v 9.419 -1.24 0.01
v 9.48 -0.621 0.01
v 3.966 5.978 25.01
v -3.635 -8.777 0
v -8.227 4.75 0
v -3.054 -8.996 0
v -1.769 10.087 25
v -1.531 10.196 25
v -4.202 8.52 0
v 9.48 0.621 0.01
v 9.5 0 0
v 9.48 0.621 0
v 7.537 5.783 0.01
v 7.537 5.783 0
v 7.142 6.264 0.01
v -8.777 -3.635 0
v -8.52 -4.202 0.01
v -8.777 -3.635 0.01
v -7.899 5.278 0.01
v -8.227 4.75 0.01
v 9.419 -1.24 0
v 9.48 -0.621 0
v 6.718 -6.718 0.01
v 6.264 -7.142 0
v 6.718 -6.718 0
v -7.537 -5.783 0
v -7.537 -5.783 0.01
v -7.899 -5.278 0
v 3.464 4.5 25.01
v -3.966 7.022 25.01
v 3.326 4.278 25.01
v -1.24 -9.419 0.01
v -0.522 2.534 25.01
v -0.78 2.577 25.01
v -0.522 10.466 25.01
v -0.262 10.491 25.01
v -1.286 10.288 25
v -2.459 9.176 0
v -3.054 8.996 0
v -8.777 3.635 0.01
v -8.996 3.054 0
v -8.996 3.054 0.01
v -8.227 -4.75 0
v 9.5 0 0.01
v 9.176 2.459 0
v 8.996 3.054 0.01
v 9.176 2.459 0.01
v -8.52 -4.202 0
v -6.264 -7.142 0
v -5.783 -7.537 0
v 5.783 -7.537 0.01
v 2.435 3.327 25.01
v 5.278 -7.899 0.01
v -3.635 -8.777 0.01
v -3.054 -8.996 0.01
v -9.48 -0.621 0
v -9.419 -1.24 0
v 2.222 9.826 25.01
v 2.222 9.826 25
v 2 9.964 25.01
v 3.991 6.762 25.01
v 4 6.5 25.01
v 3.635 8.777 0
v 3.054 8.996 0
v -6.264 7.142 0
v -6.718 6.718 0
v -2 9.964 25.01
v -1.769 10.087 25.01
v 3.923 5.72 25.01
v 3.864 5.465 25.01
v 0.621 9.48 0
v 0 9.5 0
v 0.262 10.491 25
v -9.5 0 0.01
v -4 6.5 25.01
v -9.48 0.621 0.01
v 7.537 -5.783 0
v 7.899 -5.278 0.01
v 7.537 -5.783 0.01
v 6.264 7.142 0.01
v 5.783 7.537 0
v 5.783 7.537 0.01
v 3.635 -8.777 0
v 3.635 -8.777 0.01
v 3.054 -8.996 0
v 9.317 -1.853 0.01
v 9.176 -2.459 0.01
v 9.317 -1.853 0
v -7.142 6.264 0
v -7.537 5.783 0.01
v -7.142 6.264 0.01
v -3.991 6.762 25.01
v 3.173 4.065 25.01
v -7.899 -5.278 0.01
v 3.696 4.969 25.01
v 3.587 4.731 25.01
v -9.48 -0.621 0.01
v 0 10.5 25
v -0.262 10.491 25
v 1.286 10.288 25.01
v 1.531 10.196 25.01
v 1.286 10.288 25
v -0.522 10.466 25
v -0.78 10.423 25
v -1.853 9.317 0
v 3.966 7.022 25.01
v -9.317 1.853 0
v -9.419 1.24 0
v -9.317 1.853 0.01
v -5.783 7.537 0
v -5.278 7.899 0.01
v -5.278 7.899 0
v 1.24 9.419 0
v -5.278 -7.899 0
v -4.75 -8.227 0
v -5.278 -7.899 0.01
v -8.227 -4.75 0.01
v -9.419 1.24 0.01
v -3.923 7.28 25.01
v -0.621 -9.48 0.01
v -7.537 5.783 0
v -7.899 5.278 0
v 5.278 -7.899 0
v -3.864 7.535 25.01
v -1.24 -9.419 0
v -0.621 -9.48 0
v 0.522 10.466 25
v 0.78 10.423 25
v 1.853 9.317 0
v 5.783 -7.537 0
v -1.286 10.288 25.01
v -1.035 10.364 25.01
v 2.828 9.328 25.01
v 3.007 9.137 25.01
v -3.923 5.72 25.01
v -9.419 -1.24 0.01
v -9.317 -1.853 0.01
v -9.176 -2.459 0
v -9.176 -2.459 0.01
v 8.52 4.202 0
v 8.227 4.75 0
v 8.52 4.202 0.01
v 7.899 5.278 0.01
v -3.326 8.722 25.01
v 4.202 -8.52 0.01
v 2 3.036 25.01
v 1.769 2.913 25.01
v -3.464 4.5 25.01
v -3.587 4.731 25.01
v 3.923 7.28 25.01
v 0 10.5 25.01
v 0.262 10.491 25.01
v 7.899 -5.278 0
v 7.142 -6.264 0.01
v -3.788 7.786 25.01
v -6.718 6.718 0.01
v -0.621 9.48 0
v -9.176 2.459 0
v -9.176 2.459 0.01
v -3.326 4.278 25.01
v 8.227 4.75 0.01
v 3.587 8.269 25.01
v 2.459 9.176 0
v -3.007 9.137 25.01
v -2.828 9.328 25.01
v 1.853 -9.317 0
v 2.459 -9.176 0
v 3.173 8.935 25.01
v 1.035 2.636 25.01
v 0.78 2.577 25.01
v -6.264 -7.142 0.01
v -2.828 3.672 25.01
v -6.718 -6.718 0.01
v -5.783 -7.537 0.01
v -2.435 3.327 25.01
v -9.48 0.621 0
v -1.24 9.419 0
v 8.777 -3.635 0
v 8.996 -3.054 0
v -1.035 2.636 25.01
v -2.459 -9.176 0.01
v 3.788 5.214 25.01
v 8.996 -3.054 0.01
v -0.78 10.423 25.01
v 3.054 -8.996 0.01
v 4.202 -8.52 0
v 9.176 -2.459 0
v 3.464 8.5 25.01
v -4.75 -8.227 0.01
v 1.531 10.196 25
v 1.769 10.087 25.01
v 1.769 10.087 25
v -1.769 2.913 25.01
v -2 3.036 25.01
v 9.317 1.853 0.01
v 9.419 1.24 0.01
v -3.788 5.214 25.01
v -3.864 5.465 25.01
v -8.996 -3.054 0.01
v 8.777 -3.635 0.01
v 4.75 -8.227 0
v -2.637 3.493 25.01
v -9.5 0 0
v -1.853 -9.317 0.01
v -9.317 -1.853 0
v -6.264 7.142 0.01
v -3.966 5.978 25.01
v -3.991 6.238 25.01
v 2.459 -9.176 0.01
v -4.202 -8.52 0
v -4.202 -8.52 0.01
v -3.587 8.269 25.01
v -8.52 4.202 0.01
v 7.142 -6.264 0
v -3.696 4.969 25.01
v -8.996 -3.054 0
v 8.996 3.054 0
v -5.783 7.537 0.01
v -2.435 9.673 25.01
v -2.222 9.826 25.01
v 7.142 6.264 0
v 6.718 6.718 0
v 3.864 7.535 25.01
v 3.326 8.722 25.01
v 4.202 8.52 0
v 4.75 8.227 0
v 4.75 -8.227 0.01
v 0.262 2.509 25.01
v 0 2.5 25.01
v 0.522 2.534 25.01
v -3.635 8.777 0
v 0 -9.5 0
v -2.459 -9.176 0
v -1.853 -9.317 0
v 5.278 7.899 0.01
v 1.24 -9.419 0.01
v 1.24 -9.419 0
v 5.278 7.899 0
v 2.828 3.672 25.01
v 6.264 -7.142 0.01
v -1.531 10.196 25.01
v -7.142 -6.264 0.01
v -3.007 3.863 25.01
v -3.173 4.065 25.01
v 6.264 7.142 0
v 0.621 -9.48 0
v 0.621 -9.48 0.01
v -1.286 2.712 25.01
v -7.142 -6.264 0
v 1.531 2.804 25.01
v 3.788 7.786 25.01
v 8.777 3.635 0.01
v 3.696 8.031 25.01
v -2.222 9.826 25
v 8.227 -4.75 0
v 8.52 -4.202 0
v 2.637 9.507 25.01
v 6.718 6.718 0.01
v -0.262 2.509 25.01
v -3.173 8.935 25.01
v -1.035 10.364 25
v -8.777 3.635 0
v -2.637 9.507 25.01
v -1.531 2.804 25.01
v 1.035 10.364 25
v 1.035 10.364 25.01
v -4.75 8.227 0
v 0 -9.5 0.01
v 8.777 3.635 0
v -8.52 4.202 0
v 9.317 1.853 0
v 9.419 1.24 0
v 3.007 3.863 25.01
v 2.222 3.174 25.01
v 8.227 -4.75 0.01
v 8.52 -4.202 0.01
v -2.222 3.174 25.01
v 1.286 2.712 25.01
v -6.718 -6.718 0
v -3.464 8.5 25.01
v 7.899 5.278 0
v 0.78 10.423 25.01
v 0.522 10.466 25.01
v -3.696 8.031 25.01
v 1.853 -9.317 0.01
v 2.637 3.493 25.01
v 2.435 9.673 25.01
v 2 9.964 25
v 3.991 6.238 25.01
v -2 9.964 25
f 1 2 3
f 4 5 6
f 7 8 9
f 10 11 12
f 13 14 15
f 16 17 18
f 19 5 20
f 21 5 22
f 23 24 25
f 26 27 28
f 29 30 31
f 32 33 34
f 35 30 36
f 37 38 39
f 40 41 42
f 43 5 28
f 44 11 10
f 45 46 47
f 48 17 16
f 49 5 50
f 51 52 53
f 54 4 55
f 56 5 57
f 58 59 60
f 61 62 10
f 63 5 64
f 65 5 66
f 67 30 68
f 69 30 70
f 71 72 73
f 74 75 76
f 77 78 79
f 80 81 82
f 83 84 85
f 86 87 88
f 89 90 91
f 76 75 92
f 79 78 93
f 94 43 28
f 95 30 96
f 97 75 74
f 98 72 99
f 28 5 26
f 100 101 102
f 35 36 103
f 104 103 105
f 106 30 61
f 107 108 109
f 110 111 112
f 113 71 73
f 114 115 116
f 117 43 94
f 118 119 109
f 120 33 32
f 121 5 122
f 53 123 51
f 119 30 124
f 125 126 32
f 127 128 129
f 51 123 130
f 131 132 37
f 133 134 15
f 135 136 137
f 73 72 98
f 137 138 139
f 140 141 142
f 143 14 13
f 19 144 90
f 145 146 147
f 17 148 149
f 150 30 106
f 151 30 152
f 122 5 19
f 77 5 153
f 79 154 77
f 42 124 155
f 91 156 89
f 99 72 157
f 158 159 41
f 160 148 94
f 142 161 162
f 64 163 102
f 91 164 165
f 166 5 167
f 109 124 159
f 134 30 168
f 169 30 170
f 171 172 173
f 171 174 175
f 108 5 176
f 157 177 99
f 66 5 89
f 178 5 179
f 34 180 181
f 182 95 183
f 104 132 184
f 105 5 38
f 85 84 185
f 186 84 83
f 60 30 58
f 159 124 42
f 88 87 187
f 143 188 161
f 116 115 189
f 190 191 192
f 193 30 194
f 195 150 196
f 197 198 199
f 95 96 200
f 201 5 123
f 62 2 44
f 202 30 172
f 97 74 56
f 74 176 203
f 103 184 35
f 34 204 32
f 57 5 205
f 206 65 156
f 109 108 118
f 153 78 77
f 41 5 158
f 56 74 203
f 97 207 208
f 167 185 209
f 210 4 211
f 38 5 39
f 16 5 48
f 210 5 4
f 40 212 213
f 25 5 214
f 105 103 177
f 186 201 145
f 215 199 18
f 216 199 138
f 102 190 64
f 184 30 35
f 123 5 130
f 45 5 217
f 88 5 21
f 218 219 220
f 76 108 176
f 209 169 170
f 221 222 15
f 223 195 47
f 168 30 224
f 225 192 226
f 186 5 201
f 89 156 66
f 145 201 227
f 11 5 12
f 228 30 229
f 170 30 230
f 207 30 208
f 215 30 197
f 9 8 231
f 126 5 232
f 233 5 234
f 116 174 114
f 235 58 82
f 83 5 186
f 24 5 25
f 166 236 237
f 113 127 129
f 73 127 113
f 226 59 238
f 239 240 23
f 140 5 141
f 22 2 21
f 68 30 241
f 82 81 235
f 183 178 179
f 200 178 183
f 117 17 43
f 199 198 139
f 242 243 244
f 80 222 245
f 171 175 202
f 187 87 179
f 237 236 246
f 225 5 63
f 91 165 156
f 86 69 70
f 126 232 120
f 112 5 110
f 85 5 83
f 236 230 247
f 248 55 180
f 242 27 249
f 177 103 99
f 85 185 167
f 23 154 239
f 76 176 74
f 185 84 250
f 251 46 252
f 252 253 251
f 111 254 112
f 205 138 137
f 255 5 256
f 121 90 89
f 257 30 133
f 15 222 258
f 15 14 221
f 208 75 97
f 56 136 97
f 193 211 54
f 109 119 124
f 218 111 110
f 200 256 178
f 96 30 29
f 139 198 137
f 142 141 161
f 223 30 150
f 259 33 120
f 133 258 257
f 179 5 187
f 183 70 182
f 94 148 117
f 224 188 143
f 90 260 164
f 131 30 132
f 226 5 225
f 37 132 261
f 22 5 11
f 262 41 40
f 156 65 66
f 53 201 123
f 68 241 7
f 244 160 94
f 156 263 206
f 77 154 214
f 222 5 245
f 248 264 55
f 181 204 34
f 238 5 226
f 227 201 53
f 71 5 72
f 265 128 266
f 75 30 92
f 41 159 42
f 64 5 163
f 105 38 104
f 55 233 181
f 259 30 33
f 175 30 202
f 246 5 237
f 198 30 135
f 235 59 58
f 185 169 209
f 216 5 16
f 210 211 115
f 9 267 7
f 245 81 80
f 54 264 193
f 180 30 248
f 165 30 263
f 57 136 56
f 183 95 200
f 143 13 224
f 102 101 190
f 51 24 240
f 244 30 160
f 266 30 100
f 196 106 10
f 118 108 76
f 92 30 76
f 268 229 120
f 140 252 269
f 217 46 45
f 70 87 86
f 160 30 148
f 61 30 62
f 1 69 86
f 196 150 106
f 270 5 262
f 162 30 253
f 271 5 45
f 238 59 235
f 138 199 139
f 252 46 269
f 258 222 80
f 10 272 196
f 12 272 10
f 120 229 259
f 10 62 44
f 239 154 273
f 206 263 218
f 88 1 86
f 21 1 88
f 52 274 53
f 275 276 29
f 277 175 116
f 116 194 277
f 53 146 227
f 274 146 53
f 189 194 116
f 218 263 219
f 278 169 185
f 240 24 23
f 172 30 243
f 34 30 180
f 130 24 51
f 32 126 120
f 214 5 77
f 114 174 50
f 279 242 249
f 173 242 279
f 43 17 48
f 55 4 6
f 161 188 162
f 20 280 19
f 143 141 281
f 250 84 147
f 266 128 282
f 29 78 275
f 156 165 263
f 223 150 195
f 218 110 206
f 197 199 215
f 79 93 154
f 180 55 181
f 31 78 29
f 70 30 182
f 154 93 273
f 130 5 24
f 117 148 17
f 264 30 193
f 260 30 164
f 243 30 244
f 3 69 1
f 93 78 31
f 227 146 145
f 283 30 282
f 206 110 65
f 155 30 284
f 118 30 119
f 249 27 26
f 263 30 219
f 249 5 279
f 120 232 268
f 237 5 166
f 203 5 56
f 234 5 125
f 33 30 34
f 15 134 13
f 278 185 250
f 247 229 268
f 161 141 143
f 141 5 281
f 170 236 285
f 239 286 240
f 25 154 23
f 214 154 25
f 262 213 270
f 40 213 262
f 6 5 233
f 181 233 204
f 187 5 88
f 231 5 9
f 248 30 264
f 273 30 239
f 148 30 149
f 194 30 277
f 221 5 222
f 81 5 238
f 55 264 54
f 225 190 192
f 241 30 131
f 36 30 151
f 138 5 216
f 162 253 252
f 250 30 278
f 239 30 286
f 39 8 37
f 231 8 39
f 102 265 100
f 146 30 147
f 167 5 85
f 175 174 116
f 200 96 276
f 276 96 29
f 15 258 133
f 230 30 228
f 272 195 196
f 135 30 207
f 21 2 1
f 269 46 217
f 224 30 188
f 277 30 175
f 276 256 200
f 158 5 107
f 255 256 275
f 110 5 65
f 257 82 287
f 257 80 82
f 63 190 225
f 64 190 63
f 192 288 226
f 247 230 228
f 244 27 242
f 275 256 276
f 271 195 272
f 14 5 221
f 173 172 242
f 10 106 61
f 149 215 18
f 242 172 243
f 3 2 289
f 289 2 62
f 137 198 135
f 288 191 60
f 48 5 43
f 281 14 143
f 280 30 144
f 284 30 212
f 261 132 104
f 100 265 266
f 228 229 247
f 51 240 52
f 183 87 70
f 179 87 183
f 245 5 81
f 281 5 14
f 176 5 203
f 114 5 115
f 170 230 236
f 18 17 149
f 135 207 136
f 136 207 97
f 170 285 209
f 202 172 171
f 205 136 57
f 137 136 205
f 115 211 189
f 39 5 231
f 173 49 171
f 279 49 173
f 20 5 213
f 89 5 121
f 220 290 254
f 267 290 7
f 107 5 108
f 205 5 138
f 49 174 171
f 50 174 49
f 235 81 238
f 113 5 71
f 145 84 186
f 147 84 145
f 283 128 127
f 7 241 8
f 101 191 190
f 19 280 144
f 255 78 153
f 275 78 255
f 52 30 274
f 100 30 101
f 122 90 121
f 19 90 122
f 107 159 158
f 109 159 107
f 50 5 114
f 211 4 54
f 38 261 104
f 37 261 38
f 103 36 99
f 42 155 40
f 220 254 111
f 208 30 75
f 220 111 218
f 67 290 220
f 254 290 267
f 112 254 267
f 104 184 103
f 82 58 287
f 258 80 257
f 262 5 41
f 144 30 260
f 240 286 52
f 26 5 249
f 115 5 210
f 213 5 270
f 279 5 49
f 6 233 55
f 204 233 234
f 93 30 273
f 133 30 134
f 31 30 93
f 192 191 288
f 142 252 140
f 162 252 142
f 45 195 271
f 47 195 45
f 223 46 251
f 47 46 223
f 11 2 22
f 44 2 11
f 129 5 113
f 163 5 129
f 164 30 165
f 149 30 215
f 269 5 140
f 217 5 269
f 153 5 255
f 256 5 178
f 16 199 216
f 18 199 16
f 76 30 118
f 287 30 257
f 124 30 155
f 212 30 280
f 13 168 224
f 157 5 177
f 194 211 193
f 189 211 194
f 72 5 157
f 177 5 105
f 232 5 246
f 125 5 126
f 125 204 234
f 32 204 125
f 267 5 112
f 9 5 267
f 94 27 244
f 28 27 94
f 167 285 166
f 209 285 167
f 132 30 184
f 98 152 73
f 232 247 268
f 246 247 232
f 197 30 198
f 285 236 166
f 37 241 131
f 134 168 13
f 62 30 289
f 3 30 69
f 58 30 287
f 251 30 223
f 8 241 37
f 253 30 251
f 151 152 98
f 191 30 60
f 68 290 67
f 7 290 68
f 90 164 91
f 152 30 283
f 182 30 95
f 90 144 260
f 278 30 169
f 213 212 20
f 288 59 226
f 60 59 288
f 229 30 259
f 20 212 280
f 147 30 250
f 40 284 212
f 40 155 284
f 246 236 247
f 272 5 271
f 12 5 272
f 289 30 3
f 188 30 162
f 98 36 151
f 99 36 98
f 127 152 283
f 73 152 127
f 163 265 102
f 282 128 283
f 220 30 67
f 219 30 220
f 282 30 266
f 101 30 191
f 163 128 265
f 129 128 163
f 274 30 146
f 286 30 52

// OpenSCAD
// hull of two thin disks, the small one overhanging the big one far above it — OpenSCAD's way to
// loft between two circles (thing 54029, a pump splitter). Its vertical tangent planes each touch
// four circles, with the bridges crossing the equator at a shallow angle.
$fn = 96;
hull() {
  cylinder(r = 9.5, h = 0.01);
  translate([0, 6.5, 25]) cylinder(r = 4, h = 0.01);
}
